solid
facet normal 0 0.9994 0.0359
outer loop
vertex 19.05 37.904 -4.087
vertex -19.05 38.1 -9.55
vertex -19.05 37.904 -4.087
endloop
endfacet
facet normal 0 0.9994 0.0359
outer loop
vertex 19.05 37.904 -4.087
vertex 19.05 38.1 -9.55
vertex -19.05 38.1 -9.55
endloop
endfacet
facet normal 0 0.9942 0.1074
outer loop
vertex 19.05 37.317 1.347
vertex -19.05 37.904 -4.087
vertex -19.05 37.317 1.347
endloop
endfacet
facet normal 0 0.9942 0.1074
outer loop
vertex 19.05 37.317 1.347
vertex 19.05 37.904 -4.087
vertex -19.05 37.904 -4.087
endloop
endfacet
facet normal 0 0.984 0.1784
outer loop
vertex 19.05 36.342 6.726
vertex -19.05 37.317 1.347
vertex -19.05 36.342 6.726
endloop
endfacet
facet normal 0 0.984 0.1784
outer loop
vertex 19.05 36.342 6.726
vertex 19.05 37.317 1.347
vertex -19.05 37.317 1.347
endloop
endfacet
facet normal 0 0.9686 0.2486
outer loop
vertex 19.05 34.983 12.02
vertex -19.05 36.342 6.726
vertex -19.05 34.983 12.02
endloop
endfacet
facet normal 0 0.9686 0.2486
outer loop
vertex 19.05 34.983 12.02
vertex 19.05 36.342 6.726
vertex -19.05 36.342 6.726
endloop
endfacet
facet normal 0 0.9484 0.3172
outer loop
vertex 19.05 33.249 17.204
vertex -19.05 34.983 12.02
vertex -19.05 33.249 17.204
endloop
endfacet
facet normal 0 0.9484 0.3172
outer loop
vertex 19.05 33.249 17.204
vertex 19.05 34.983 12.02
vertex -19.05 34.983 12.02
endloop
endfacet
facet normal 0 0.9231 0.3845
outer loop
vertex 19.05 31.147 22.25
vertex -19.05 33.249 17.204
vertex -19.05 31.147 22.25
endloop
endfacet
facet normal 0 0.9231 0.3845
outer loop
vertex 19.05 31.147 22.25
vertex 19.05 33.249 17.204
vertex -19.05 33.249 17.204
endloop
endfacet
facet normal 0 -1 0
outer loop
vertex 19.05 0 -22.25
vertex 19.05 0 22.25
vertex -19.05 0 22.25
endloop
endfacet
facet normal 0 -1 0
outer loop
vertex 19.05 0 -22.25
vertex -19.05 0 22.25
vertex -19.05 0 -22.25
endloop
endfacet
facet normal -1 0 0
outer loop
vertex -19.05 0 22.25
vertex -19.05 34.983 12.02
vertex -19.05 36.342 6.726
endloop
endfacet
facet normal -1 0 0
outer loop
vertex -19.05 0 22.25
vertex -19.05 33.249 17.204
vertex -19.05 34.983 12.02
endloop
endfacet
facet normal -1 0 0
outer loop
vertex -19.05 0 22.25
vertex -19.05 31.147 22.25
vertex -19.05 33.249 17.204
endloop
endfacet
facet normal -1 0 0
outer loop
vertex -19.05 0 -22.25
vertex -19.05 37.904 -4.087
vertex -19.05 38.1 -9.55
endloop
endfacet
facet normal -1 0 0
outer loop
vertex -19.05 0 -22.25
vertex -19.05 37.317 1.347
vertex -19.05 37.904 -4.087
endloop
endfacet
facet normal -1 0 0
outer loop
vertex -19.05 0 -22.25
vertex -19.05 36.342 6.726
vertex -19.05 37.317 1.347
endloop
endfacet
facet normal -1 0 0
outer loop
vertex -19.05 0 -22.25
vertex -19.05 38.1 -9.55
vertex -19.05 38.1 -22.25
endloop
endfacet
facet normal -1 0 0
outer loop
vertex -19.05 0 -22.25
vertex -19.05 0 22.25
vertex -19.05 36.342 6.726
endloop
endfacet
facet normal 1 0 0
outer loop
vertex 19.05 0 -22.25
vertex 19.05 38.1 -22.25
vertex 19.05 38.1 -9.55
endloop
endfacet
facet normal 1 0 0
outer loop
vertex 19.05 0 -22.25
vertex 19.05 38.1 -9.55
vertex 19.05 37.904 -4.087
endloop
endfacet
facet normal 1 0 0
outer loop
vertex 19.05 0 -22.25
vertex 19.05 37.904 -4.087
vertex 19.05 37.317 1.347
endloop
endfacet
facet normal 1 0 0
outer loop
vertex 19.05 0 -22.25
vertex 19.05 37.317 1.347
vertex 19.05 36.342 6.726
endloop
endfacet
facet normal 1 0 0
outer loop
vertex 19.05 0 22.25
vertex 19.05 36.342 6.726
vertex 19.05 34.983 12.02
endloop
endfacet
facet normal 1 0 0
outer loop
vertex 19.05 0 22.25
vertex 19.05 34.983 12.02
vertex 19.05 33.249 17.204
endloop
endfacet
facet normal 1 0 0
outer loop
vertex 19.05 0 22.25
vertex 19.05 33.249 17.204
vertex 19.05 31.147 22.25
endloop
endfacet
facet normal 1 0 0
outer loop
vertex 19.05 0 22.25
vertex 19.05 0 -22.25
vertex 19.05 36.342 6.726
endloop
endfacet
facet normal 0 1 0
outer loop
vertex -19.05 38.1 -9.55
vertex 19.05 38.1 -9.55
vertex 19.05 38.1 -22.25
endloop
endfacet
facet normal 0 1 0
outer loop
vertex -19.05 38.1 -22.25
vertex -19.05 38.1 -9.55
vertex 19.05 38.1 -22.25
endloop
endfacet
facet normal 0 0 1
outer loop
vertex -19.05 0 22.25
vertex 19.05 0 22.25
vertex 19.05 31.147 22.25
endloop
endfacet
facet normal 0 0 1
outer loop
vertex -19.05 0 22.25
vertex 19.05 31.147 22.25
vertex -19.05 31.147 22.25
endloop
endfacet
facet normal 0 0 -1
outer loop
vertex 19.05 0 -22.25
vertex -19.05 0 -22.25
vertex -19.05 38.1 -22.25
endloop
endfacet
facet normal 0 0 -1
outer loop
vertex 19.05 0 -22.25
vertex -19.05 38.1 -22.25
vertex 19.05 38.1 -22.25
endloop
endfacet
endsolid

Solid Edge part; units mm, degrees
sketch "Sketch1" plane through (0, 0, 0) normal (0, -1, 0) x (1, 0, 0)
  line L0 (19.05, 22.25) -> (-19.05, 22.25)
  line L1 (-19.05, 22.25) -> (-19.05, -22.25)
  line L2 (-19.05, -22.25) -> (19.05, -22.25)
  line L3 (19.05, -22.25) -> (19.05, 22.25)
extrude "Protrusion1" add sketch "Sketch1" against normal blind 38.1
sketch "Sketch2" plane through (19.05, 19.05, 0) normal (1, 0, 0) x (0, 1, 0)
  line L0 (12.0974, 22.25) -> (19.05, 22.25)
  line L1 (19.05, 22.25) -> (19.05, -9.55)
  arc A0 (19.05, -9.55) -> (12.0974, 22.25) centre (-57.15, -9.55) ccw
extrude "ExtrudedCutout_2" cut sketch "Sketch2" against normal blind 42
